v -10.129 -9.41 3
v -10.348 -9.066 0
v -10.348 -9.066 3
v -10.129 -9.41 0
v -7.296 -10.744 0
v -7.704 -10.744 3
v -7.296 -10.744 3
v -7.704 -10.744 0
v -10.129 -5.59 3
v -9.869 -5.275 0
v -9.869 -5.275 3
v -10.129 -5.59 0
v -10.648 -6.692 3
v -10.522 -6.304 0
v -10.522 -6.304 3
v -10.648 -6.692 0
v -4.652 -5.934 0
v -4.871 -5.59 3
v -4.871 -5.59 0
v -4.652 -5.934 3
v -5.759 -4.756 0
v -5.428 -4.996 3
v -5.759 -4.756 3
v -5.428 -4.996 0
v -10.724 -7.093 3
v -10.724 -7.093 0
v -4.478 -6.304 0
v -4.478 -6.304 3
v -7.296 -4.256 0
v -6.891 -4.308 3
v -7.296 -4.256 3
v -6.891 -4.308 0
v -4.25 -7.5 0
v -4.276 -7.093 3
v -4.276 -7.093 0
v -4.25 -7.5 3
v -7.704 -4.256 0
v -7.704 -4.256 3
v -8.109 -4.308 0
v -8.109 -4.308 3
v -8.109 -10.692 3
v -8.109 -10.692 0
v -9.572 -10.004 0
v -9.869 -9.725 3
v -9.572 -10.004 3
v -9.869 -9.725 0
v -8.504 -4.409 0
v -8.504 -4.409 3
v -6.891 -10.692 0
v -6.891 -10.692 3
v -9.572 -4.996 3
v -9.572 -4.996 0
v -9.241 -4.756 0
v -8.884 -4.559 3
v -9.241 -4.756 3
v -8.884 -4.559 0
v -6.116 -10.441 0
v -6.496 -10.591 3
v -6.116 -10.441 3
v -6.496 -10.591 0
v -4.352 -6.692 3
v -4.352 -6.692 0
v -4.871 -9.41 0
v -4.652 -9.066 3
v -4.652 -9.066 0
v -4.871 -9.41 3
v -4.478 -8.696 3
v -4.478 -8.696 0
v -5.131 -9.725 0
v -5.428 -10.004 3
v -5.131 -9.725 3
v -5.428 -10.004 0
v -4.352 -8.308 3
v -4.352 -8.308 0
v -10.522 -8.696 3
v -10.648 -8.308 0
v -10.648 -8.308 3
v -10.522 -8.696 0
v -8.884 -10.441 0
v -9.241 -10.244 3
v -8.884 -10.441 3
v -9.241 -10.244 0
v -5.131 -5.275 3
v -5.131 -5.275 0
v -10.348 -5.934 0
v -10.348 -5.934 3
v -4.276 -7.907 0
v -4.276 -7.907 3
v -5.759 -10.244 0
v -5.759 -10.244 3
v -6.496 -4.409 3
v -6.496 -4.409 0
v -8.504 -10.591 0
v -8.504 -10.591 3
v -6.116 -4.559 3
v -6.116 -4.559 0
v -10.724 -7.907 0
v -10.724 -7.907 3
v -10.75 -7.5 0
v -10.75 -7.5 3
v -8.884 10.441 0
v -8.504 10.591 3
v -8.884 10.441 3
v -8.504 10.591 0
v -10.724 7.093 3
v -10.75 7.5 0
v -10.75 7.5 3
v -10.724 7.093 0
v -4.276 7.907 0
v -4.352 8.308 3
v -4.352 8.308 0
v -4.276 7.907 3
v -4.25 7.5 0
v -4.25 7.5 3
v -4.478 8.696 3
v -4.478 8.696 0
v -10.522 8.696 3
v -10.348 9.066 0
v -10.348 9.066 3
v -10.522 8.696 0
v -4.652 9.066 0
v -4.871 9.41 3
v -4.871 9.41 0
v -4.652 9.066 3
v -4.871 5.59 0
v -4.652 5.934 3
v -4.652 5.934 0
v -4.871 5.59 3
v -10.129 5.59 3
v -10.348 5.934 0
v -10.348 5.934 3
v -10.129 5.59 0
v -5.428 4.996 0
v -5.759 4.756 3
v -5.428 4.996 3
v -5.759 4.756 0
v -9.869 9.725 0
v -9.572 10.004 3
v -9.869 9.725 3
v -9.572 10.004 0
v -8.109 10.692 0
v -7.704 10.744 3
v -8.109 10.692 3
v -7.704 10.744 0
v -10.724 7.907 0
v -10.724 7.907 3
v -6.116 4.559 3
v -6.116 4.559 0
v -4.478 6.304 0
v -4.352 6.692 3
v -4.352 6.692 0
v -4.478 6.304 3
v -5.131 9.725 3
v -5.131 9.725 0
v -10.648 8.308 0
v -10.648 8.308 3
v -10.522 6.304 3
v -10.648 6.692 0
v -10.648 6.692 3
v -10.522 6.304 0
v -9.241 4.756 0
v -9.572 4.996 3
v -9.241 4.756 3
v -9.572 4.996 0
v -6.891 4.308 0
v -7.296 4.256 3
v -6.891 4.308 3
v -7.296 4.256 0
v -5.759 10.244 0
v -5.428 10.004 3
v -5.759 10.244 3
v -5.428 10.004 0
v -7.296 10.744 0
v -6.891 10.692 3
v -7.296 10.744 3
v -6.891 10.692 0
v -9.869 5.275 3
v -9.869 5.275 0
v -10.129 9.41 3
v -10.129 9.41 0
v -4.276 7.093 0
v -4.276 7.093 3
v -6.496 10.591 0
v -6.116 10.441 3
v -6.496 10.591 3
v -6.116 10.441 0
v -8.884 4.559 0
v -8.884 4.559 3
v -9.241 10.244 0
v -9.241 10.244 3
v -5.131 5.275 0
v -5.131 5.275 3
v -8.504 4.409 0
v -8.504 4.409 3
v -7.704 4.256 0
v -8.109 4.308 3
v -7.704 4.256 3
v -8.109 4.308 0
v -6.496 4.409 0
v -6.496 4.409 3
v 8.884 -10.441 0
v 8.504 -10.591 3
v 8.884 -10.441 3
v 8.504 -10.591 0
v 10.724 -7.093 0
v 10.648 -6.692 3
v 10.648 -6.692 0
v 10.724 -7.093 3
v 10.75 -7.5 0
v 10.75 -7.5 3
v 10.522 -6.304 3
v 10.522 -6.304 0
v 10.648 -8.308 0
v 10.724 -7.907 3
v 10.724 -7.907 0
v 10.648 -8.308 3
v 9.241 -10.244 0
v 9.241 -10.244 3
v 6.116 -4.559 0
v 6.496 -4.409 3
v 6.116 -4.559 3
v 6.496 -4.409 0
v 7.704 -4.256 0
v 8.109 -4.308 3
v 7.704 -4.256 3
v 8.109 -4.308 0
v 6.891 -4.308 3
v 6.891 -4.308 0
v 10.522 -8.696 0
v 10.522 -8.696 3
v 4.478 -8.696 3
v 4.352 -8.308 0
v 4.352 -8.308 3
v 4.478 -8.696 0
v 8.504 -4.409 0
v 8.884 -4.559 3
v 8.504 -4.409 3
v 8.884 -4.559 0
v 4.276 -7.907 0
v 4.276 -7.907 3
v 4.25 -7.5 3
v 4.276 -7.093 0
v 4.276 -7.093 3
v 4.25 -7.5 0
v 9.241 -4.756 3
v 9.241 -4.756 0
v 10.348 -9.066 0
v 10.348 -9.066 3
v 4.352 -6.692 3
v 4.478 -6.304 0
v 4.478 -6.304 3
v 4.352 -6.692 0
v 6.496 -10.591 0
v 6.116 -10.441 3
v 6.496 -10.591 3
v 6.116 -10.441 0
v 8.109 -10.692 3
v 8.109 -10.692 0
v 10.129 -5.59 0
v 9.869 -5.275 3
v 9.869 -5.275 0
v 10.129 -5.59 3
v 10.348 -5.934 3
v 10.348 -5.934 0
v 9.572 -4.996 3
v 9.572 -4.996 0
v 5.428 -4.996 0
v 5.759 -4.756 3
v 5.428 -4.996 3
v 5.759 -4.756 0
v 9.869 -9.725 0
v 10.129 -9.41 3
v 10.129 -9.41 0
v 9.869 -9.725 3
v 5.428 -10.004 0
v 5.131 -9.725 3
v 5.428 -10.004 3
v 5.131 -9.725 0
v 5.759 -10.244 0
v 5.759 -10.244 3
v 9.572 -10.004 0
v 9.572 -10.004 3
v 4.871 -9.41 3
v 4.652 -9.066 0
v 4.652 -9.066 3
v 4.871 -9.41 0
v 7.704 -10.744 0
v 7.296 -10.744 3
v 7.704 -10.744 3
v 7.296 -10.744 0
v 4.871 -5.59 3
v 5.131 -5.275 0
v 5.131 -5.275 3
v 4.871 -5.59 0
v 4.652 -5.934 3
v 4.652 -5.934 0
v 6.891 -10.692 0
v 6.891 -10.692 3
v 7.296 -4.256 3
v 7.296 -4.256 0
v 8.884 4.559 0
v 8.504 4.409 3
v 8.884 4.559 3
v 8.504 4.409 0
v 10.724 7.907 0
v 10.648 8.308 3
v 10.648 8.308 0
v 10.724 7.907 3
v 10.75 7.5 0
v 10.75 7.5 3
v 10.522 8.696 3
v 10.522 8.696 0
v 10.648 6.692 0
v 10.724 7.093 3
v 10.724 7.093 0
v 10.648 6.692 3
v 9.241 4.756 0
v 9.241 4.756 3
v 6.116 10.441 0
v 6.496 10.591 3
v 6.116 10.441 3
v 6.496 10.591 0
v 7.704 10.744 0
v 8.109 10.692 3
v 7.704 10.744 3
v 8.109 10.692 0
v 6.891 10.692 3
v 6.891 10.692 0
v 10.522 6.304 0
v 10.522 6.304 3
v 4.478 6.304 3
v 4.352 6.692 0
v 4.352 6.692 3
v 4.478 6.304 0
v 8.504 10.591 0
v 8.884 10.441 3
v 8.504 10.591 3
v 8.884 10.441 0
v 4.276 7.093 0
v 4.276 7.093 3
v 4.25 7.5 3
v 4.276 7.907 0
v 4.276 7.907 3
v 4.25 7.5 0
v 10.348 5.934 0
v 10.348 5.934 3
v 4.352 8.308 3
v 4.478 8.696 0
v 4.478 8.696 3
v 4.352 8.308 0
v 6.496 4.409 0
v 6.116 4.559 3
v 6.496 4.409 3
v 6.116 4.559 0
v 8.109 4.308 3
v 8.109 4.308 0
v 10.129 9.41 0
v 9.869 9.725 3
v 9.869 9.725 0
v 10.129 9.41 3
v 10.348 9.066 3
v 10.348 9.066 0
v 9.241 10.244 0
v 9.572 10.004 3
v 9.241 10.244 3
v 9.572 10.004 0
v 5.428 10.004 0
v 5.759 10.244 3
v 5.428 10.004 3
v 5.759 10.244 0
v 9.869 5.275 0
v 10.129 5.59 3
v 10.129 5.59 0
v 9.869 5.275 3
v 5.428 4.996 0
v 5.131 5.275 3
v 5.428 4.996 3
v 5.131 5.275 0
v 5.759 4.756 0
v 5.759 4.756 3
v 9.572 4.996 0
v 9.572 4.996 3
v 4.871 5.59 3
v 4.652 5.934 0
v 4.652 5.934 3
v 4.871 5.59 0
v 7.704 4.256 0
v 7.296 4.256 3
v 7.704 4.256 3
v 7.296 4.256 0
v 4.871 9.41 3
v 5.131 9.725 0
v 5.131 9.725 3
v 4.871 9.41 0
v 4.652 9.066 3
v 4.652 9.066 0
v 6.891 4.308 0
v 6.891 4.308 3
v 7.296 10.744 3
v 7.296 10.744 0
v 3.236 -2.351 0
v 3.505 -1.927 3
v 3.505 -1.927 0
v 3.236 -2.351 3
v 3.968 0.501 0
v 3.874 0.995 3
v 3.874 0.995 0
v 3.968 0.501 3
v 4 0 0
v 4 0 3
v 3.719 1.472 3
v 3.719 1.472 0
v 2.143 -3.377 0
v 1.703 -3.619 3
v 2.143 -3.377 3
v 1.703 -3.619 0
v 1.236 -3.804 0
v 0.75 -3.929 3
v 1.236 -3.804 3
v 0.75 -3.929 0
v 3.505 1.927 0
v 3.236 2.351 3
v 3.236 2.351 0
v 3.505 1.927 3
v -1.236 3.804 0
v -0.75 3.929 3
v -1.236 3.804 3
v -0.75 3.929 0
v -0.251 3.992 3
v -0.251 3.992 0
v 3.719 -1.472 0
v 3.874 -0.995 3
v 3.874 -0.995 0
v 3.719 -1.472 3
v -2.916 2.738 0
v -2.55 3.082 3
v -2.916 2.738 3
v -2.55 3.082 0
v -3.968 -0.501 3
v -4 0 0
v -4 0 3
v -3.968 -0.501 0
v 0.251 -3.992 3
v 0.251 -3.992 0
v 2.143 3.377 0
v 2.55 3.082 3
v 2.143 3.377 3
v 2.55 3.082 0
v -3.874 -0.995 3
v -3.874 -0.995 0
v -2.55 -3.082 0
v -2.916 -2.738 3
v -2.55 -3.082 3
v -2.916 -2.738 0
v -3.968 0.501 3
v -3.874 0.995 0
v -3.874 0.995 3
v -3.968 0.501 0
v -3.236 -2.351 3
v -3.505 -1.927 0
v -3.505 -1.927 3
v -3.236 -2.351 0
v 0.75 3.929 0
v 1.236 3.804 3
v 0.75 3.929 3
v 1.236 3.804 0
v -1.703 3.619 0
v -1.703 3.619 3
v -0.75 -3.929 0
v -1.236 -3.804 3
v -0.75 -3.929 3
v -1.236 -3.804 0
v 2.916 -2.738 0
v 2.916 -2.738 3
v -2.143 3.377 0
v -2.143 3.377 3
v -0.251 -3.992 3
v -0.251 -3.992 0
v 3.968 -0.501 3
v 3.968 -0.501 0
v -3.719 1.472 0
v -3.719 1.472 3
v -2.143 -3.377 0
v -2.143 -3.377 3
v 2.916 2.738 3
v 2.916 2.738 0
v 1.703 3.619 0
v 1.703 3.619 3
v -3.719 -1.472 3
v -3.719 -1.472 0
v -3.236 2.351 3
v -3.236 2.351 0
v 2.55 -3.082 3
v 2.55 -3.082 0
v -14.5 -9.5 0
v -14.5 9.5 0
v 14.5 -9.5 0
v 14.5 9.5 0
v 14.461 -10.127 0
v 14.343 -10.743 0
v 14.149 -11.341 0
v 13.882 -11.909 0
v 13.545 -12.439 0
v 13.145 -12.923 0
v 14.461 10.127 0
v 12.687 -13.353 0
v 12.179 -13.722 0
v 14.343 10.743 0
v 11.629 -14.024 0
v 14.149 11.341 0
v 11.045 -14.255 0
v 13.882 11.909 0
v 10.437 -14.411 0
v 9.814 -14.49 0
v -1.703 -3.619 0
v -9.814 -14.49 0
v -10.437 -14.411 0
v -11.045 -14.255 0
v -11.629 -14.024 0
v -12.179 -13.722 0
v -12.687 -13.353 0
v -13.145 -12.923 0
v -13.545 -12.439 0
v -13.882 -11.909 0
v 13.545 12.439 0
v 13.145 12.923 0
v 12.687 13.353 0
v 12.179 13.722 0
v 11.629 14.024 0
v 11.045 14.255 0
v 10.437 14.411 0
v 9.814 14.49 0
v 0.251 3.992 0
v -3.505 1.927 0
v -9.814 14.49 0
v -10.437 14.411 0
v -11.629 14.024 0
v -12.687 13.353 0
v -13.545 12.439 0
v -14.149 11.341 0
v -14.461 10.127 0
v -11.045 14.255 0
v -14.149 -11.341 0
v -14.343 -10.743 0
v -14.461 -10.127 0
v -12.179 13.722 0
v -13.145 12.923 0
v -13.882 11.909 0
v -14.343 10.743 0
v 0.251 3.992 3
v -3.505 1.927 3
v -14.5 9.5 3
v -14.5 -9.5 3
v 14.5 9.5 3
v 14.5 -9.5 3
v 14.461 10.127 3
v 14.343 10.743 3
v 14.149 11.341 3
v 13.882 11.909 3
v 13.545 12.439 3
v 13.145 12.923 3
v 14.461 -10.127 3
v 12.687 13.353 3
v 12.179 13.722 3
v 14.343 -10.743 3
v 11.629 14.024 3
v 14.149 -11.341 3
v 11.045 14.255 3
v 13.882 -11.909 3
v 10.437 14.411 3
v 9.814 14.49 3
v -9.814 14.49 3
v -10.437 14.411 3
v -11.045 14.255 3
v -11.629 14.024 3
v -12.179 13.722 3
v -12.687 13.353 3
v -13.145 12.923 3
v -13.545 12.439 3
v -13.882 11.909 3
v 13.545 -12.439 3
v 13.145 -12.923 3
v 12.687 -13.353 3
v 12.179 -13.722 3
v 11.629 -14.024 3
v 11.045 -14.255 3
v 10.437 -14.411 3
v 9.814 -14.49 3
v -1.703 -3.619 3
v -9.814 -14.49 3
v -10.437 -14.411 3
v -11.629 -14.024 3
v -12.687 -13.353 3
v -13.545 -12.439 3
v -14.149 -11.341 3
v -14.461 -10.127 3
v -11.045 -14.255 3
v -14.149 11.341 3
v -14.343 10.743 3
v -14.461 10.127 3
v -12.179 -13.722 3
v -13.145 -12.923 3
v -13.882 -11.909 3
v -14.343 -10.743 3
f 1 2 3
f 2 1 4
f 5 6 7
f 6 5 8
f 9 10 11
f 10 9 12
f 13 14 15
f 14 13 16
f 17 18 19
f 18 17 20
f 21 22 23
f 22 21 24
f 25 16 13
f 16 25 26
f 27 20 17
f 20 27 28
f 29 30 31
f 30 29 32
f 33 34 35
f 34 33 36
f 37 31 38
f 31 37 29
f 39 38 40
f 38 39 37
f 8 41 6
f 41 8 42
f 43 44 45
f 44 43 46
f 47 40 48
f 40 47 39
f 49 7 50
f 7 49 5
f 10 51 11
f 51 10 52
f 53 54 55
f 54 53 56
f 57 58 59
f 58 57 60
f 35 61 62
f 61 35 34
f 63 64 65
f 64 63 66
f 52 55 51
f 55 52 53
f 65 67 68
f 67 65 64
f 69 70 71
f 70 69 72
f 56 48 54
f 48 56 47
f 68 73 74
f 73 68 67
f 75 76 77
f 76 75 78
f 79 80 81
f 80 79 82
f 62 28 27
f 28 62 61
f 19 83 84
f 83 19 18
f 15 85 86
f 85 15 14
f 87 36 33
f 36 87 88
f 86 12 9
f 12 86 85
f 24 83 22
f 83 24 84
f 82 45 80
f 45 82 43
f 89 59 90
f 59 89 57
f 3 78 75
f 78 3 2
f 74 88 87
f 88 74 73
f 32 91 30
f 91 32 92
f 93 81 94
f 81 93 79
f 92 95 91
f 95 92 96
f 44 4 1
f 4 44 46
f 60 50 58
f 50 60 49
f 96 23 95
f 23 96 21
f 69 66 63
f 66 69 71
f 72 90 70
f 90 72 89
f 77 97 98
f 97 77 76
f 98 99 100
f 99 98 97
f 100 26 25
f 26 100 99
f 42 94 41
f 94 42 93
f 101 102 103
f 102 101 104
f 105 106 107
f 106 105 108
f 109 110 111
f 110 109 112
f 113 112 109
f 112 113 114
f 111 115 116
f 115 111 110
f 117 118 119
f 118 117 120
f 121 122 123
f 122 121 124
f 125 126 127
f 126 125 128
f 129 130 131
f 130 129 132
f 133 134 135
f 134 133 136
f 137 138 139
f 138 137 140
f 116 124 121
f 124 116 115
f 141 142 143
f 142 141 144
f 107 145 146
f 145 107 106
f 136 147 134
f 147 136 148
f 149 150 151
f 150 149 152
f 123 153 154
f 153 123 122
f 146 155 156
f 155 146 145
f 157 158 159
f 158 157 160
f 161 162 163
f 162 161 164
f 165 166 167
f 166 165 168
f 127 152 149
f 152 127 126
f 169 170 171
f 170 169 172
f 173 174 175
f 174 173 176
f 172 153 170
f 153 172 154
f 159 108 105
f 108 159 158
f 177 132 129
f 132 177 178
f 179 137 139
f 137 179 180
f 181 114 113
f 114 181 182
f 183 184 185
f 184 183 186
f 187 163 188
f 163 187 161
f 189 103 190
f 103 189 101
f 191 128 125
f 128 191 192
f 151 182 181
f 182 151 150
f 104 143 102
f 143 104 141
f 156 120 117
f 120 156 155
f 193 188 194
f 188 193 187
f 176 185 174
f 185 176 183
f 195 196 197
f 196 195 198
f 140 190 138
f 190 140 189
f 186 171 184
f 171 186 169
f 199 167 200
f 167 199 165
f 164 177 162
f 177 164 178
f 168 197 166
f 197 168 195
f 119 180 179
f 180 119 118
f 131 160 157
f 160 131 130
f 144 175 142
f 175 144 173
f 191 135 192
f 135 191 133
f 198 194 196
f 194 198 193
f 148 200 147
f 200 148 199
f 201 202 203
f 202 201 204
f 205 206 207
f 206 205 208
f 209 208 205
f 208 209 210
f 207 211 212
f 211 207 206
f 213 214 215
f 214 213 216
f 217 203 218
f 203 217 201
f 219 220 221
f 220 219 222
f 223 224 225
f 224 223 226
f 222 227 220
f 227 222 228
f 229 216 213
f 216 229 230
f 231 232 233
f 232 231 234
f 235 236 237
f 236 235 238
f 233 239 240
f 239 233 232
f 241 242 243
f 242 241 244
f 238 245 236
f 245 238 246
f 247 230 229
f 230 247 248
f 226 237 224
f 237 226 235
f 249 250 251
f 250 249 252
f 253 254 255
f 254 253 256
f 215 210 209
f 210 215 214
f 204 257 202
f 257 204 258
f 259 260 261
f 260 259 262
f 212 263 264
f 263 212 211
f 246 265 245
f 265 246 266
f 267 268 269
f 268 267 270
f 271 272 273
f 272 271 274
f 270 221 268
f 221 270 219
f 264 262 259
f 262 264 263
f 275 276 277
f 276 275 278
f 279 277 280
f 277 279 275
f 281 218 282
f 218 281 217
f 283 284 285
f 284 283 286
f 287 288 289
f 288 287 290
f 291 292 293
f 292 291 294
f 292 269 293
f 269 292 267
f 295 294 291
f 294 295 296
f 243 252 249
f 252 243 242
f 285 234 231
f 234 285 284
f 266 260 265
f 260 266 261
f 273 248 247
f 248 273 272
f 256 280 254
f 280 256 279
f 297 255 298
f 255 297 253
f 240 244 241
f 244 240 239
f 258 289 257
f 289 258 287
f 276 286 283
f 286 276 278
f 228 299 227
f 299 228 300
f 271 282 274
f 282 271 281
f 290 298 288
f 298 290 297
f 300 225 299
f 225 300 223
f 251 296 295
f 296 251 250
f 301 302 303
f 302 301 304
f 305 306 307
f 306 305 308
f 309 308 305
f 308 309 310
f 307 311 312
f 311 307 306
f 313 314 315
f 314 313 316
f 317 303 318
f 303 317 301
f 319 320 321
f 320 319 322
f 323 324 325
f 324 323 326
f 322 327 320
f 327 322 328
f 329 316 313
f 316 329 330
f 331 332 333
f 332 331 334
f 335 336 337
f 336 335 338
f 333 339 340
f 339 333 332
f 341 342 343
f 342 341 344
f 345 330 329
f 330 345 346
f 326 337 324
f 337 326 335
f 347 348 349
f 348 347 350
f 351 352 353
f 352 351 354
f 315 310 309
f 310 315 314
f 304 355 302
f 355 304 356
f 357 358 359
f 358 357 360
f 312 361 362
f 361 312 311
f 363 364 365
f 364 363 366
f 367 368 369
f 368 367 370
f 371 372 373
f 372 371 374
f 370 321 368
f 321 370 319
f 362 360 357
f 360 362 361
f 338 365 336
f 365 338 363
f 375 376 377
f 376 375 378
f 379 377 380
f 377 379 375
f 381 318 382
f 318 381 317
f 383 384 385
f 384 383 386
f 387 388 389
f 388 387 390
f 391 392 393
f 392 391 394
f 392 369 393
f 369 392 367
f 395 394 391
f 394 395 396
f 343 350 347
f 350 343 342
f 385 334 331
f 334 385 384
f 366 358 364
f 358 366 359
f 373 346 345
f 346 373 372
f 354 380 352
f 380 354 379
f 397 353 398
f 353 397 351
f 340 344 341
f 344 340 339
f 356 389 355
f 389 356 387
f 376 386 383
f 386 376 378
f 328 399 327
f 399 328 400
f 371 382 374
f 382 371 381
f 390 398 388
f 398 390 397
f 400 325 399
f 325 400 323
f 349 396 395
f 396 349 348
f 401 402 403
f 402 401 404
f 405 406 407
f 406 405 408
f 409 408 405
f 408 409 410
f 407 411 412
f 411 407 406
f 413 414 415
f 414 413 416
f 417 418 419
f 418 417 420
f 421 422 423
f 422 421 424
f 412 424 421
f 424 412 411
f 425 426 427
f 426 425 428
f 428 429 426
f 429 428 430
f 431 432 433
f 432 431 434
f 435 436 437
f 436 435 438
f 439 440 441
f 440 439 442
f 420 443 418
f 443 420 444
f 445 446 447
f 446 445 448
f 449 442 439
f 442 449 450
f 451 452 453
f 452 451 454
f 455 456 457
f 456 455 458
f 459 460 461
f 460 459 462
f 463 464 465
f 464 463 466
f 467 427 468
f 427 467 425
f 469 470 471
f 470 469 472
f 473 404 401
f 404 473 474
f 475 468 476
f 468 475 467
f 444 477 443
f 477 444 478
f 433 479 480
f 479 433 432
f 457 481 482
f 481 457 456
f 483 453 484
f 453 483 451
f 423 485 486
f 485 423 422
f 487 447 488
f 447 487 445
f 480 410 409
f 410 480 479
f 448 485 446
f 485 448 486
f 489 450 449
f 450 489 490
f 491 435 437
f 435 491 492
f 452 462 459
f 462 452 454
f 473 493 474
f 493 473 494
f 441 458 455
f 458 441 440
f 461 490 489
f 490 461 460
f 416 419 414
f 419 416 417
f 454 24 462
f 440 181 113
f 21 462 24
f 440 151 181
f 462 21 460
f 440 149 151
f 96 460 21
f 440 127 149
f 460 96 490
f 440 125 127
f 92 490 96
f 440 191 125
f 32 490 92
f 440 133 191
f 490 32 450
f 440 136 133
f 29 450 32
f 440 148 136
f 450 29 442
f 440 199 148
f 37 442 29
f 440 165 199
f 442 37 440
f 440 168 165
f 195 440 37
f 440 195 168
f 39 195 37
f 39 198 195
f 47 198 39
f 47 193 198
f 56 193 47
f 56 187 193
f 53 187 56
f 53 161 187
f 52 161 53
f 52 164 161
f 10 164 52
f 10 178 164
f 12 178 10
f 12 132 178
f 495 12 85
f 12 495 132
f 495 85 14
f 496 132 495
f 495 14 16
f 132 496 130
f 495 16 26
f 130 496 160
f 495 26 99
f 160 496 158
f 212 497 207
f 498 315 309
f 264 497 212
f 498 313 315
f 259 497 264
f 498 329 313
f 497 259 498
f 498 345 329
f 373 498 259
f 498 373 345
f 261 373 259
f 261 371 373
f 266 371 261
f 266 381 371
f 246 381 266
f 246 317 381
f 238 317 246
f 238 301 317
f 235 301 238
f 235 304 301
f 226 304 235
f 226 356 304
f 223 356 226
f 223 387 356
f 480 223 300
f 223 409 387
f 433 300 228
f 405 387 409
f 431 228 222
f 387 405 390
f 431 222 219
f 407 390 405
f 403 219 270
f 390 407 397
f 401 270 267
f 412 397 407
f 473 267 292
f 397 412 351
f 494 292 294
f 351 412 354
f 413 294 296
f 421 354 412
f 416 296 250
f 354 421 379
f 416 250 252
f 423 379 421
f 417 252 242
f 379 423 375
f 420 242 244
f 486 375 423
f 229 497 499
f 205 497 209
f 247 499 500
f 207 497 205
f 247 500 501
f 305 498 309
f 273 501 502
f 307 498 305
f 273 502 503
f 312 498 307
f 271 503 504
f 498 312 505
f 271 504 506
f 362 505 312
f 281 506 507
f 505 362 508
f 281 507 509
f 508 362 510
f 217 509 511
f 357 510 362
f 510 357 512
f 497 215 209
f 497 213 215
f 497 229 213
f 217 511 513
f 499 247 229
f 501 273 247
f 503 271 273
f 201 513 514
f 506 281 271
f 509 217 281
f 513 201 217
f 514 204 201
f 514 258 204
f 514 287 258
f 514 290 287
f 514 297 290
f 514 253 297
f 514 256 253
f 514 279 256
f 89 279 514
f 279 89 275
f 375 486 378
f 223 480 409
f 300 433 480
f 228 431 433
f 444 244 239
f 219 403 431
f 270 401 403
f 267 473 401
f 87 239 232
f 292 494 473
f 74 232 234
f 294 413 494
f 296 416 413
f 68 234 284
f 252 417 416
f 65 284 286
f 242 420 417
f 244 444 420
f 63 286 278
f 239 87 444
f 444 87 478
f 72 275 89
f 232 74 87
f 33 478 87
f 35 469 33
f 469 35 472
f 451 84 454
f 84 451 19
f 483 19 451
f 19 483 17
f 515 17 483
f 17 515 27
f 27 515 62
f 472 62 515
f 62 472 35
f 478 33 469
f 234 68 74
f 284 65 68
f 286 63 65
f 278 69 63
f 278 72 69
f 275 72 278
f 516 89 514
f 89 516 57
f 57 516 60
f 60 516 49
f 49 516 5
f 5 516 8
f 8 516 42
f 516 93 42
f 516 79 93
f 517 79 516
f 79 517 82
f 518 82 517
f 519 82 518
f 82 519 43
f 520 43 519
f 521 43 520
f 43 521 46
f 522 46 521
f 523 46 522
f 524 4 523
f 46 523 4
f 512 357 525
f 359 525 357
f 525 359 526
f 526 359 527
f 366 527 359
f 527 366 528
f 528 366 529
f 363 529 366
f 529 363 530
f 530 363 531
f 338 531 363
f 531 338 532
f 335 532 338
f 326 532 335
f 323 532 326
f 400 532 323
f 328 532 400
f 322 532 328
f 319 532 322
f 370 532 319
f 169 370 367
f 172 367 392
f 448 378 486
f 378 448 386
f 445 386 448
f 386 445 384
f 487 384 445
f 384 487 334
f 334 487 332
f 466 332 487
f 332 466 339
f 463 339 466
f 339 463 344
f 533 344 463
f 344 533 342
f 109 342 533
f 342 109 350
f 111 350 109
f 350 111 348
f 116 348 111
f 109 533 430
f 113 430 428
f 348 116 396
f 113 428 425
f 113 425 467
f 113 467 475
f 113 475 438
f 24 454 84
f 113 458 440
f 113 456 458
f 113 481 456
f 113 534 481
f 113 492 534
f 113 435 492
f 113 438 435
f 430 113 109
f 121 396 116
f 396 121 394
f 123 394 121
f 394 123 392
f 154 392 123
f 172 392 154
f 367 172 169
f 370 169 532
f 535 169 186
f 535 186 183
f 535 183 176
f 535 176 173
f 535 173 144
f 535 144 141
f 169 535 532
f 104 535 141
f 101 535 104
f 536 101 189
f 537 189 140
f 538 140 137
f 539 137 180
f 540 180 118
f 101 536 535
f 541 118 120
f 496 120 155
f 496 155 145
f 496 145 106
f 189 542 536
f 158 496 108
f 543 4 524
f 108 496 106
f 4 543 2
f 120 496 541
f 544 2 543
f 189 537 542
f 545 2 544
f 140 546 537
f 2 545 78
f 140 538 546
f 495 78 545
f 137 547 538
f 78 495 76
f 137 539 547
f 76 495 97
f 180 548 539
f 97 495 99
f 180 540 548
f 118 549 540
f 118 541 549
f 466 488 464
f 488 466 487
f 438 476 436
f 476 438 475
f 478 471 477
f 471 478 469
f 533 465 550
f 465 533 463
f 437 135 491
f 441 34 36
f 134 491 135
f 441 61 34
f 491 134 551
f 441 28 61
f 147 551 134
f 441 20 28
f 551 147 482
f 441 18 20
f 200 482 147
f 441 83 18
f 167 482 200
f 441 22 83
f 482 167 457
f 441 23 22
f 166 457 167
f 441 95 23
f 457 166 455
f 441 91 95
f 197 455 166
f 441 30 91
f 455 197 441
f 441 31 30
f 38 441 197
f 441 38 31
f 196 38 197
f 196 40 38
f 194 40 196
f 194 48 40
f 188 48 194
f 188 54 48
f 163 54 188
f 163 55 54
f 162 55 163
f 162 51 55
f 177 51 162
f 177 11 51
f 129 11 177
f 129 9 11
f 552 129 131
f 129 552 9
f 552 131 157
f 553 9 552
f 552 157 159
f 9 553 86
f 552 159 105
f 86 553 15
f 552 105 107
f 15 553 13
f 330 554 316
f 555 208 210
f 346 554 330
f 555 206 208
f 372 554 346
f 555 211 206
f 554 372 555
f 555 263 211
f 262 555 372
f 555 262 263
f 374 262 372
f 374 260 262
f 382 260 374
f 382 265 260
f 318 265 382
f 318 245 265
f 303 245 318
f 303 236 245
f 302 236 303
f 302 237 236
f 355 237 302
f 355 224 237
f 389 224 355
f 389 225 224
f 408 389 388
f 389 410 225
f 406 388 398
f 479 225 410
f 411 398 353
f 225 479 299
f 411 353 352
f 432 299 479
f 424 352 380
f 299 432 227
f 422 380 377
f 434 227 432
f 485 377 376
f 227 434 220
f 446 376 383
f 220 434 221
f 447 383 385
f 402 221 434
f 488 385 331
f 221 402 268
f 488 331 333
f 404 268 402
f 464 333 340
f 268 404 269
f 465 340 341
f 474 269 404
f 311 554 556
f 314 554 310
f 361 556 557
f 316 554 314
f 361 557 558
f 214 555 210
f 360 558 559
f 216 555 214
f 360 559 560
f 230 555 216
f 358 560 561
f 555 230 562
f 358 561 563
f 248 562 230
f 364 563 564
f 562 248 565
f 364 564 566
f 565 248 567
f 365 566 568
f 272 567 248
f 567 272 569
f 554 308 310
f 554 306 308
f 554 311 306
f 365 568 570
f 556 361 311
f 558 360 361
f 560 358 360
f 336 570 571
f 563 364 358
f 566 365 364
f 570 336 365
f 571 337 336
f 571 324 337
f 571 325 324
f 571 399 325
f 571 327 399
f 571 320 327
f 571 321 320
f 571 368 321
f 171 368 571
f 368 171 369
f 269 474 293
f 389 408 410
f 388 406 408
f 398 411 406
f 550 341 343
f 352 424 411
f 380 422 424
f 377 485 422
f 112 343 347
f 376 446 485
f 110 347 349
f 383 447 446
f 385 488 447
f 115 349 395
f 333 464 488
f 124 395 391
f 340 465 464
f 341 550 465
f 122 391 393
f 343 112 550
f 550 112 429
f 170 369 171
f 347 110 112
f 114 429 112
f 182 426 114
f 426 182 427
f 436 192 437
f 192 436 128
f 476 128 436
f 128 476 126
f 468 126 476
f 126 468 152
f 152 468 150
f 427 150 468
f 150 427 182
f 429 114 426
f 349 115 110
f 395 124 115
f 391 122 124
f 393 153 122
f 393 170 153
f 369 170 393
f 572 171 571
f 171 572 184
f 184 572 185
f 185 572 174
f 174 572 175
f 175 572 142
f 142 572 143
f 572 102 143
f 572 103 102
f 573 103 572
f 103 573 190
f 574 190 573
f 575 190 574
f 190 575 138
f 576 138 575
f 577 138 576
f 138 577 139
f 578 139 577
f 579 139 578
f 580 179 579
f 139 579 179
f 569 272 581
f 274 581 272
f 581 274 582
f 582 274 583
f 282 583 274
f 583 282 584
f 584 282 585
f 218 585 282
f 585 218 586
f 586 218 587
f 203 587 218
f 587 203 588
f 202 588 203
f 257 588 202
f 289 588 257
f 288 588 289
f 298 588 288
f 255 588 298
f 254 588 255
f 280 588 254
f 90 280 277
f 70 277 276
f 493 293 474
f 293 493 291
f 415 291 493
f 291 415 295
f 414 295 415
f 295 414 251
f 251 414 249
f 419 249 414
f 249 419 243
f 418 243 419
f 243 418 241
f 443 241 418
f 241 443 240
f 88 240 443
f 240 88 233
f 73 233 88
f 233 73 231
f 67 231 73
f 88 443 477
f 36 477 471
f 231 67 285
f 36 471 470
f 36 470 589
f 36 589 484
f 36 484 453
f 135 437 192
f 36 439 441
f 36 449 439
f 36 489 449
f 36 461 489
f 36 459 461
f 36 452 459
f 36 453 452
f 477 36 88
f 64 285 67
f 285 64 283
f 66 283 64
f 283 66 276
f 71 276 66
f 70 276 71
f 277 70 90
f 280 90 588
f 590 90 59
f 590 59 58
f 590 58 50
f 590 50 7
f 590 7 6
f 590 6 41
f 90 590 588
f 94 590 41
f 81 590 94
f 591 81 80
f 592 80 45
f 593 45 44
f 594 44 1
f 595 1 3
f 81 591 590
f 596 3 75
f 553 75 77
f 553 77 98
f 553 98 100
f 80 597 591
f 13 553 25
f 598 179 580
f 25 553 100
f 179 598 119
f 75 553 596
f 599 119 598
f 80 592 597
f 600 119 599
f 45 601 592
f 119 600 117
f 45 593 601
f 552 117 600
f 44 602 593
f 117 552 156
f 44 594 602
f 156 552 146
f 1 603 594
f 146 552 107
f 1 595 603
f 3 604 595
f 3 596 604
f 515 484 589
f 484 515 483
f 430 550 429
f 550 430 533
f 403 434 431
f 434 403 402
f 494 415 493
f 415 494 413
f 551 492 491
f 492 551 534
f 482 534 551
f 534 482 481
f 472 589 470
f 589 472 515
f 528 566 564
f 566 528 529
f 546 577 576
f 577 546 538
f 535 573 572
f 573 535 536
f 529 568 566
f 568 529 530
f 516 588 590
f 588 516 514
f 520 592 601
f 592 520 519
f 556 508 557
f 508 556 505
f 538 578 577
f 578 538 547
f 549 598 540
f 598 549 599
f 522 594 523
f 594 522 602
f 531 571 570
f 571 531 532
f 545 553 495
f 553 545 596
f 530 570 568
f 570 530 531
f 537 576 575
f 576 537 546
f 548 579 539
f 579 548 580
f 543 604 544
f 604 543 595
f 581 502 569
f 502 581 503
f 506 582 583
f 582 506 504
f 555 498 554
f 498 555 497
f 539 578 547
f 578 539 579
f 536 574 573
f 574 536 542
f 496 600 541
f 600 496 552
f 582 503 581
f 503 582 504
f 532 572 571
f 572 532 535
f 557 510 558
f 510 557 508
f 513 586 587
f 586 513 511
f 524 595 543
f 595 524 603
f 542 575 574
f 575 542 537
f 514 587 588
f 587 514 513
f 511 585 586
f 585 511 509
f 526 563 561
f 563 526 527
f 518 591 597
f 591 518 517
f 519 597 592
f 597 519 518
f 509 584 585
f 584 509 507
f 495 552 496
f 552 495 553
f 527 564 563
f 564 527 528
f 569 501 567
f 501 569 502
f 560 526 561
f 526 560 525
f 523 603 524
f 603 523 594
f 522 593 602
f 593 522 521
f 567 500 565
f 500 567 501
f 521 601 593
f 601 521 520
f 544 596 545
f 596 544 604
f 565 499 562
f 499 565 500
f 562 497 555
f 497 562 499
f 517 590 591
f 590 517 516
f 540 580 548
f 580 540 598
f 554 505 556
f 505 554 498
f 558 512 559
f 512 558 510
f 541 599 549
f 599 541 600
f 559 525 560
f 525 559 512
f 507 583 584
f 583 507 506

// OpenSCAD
$fn = 50;


difference() {
	union() {
		hull() {
			translate(v = [-9.5000000000, 9.5000000000, 0]) {
				cylinder(h = 3, r = 5);
			}
			translate(v = [9.5000000000, 9.5000000000, 0]) {
				cylinder(h = 3, r = 5);
			}
			translate(v = [-9.5000000000, -9.5000000000, 0]) {
				cylinder(h = 3, r = 5);
			}
			translate(v = [9.5000000000, -9.5000000000, 0]) {
				cylinder(h = 3, r = 5);
			}
		}
	}
	union() {
		#translate(v = [-7.5000000000, -7.5000000000, -100.0000000000]) {
			cylinder(h = 200, r = 3.2500000000);
		}
		#translate(v = [-7.5000000000, 7.5000000000, -100.0000000000]) {
			cylinder(h = 200, r = 3.2500000000);
		}
		#translate(v = [7.5000000000, -7.5000000000, -100.0000000000]) {
			cylinder(h = 200, r = 3.2500000000);
		}
		#translate(v = [7.5000000000, 7.5000000000, -100.0000000000]) {
			cylinder(h = 200, r = 3.2500000000);
		}
		#cylinder(h = 3, r = 4.0000000000);
	}
}
